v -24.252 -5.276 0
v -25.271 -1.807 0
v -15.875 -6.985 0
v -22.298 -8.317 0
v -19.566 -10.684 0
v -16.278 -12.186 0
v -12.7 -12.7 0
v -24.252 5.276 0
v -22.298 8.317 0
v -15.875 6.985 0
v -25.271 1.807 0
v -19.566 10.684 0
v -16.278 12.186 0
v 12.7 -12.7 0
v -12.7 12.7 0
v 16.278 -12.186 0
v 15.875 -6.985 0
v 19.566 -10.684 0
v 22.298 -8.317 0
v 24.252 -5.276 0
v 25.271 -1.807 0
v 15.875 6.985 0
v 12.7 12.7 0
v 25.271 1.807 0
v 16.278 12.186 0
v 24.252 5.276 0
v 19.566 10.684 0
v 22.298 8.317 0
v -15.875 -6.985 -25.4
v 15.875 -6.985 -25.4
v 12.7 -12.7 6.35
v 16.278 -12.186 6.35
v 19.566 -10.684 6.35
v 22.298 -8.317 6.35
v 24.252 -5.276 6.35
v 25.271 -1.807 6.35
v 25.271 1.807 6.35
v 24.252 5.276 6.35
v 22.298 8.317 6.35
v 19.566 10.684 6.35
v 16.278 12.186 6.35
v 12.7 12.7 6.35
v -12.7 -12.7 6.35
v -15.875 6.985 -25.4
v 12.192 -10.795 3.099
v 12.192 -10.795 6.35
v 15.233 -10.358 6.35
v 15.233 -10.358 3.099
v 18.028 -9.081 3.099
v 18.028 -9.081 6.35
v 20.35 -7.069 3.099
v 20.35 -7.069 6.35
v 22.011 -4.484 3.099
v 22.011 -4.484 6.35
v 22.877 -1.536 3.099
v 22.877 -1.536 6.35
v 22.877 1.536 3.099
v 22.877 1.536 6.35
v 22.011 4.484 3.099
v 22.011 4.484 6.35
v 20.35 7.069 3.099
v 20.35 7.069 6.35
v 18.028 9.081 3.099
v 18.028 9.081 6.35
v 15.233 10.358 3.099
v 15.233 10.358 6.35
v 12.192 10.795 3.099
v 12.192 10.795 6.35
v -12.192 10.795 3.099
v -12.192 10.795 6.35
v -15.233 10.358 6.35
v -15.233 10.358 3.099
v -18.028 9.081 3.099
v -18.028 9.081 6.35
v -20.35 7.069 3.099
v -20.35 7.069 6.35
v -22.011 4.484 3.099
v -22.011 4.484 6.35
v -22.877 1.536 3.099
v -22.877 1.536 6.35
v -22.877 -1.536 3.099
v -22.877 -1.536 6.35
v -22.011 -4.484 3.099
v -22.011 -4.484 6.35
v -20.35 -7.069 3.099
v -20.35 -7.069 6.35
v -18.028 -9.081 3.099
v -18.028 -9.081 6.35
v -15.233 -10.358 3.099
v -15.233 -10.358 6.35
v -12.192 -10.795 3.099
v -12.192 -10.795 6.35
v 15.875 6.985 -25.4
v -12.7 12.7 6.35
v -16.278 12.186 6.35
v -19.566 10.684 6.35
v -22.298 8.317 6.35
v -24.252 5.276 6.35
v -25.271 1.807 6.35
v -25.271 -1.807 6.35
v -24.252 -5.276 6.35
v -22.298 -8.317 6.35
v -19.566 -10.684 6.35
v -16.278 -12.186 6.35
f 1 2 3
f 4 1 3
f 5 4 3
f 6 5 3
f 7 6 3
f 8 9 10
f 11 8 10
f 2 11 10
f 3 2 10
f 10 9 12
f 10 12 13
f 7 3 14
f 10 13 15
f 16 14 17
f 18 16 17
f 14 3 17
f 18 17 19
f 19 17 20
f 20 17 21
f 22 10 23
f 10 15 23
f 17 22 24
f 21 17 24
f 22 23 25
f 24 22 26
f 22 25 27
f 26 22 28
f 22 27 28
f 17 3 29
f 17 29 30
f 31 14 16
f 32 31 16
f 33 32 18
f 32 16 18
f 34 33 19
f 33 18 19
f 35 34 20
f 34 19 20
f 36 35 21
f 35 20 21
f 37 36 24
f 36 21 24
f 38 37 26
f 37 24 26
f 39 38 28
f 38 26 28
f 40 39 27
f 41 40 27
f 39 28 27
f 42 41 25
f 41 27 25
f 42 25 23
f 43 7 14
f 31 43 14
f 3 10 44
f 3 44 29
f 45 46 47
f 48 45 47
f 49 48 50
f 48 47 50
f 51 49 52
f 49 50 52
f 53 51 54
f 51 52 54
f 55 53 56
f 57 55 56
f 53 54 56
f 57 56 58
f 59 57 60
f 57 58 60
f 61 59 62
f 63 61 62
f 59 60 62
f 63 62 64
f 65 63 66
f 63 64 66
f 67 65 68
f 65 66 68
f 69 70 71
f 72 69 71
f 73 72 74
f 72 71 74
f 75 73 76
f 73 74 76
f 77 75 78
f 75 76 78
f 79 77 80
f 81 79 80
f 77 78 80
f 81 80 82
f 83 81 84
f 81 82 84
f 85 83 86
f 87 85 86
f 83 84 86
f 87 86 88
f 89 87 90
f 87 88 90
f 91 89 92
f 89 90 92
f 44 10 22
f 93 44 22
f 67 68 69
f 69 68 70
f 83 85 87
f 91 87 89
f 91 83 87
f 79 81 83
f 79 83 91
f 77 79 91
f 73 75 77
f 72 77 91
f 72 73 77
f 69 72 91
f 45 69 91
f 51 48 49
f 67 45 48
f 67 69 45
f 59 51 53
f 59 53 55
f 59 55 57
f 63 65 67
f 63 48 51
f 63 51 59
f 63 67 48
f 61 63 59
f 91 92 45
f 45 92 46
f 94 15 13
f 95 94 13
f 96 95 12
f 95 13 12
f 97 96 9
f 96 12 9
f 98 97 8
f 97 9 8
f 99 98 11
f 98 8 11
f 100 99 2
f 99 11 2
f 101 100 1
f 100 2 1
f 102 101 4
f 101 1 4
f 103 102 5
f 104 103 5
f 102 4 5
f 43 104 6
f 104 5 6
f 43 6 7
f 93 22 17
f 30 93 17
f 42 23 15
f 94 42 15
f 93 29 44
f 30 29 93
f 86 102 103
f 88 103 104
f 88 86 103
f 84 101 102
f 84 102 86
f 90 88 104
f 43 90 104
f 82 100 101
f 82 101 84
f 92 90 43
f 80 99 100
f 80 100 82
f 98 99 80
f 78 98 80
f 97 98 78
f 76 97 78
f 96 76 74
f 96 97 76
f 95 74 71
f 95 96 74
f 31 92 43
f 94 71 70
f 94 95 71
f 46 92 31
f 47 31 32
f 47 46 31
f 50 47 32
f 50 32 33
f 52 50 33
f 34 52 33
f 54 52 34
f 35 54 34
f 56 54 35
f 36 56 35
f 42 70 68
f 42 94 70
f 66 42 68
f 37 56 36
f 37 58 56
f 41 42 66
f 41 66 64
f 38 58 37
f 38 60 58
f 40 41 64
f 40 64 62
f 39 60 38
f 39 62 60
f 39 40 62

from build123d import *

# Parameters (mm, degrees)
F1_DEPTH = 6.35
F2_W     = 31.75
F2_H     = 13.97
F3_DEPTH = 25.4
F5_DEPTH = 3.2512


# Not quite as in the source:
# - a feature names something its author has since deleted; it is built from what else it names


with BuildPart() as f1:
    # F0 (on Top) → F1 (new body)
    with BuildSketch(Plane.XY):
        with BuildLine():
            Line((-12.7, -12.7), (12.7, -12.7))
            ThreePointArc((12.7, -12.7), (25.4, 0), (12.7, 12.7))
            Line((12.7, 12.7), (-12.7, 12.7))
            ThreePointArc((-12.7, 12.7), (-25.4, 0), (-12.7, -12.7))
        make_face()
    extrude(amount=F1_DEPTH)

    # F2 (on face) → F3 (join)
    with BuildSketch(Plane(origin=(0, 0, 0), x_dir=(1, 0, 0), z_dir=(0, 0, -1))):
        Rectangle(F2_W, F2_H)
    extrude(amount=F3_DEPTH)

    # F4 (on face) → F5 (cut)
    with BuildSketch(Plane.XY.offset(6.35)):
        with BuildLine():
            Line((-12.192, -10.795), (12.192, -10.795))
            ThreePointArc((12.192, -10.795), (22.987, 0), (12.192, 10.795))
            Line((12.192, 10.795), (-12.192, 10.795))
            ThreePointArc((-12.192, 10.795), (-22.987, 0), (-12.192, -10.795))
        make_face()
    extrude(amount=-F5_DEPTH, mode=Mode.SUBTRACT)


solid = f1.part
